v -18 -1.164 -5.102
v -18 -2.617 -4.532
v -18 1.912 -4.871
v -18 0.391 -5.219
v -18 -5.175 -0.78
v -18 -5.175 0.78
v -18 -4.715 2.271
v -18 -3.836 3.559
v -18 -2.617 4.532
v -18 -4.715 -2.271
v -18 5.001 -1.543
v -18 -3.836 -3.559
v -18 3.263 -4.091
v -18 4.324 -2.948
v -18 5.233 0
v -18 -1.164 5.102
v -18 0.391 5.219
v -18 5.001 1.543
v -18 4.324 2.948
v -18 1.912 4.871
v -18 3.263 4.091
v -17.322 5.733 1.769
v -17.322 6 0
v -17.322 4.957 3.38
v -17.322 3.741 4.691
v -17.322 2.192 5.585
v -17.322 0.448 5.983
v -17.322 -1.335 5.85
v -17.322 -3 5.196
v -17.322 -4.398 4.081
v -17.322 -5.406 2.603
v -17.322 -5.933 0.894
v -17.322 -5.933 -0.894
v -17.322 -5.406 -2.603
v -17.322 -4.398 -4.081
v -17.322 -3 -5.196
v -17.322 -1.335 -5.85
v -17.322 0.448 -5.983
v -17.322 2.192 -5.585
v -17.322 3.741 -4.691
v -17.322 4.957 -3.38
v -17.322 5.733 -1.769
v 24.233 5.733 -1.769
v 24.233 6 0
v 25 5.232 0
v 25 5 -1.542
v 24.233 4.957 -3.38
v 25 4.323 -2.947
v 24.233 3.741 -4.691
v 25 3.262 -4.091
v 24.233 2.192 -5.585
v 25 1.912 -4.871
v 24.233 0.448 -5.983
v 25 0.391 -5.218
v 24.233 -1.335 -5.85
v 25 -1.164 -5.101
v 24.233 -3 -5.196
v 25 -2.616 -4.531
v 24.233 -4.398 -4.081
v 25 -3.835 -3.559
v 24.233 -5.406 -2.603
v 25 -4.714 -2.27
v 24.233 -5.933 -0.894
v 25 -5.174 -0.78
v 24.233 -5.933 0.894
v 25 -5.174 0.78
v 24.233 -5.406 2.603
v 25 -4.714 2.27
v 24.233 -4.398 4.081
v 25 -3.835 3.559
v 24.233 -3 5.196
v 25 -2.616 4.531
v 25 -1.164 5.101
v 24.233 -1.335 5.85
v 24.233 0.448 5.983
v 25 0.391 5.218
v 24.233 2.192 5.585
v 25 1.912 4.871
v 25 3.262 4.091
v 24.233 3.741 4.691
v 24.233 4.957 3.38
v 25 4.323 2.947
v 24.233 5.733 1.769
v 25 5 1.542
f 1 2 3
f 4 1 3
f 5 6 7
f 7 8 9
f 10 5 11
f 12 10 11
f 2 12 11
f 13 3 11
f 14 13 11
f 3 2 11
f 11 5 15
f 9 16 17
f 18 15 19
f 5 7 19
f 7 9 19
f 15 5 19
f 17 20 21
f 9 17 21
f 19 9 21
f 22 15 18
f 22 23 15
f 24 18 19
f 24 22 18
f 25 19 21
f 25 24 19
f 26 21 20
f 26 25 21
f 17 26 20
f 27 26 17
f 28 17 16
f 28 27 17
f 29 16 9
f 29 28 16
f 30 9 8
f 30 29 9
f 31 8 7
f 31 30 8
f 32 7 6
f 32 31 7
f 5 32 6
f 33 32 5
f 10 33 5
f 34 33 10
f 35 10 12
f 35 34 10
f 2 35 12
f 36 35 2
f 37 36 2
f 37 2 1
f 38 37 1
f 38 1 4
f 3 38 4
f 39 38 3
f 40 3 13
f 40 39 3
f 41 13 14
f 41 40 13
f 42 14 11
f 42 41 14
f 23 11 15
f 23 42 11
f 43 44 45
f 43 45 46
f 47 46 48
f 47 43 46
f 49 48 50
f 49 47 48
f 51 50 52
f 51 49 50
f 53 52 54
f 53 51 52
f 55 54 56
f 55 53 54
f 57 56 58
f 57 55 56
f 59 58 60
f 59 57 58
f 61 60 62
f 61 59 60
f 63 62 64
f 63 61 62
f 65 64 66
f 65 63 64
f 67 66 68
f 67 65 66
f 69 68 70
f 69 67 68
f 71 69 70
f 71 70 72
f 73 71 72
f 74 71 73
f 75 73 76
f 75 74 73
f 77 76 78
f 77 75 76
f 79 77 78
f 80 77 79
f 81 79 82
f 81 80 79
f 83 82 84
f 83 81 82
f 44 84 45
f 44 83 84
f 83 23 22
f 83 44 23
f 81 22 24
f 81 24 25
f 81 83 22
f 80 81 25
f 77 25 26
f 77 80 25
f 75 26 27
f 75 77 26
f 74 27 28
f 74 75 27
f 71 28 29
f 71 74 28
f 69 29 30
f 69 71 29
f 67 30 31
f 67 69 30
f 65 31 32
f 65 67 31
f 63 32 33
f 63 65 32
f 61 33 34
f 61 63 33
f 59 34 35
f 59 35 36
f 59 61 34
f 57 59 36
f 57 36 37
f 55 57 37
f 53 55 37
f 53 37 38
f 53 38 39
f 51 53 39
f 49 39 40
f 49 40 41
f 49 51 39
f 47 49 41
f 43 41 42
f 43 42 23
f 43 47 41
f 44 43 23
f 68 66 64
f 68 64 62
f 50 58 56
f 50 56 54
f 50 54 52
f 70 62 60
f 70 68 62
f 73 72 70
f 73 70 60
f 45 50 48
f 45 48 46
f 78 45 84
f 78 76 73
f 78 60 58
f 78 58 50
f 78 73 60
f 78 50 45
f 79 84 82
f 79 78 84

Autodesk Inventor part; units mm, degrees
ref_plane "YZ Plane" through (0, 0, 0) normal (1, 0, 0) x (0, 1, 0)
ref_plane "XZ Plane" through (0, 0, 0) normal (0, 1, 0) x (-1, 0, 0)
sketch "Skizze1" plane through (0, 0, 0) normal (0, 0, 1) x (1, 0, 0)
  line L0 (25, 6) -> (25, 0)
  line L1 (-18, 0) -> (25, 0)
  line L2 (-26.6, 0) -> (33.6, 0) projected
  line L3 (0, 7.2) -> (0, -1.2) projected
  line L4 (-18, 6) -> (-18, 0)
  line L5 (2, 6) -> (2, 0) construction
  line L6 (-26.6, 0) -> (33.6, 0) projected
  line L7 (-18, 6) -> (25, 6)
  dimension "d4" = 18
  dimension "d5" = 25
  dimension "d6" = 23
  dimension "d13" = 12
revolve "Körper" add sketch "Skizze1" angle 360 about axis through (-18, 0, 0) along (1, 0, 0)
thread "Gewinde1" size "M12x1.25" class "6g" standard "ISO Metric profile" length 18
thread "Gewinde2" size "M12x1.25" class "6g" standard "ISO Metric profile" length 23.7668
chamfer "Fase1" distance 0.7678 distance2 0.7668 1 edges at (25, -6, 0) measured on face at (25, -3.0269, -1.5886)
chamfer "Fase2" distance 0.6776 distance2 0.7668 1 edges at (-18, -6, 0) measured on face at (10.1555, 5.9223, -0.9625)
ref_plane "Work Plane1" through (2.75, 0, 0) normal (0, -1, 0) x (1, 0, 0)
equation "\"d4\" = KOH"
equation "\"d5\" = NLG"
equation "\"d6\" = GEL"
equation "\"d13\" = GD"
equation "\"d1\" = KOH"
equation "\"d7\" = GEL + GAL"
equation "\"d10\" = -0.5 * SPD + 0.5 * GD"
equation "\"d12\" = -0.5 * SPD + 0.5 * GD"
equation "\"NLG\" = 25"
equation "\"GEL\" = 23"
equation "\"GAL\" = 0.61345 * PTC"
equation "\"SPD\" = NND - 1.2269 * PTC"
equation "\"d0\" = GD"
equation "\"GUL\" = 0.61345 * PTC"
equation "\"KOH\" = 18"
equation "\"GD\" = NND"
equation "\"BDM\" = NND"
equation "\"GUL1\" = 0.67658"
equation "\"GAL1\" = GAL"
equation "\"d80\" = -GUL - GEL"
equation "\"d86\" = -KOH + GUL1"
equation "\"PTC\" = 1.25"
equation "\"THREADDIA\" = 12"
equation "\"TOA\" = 30deg"
equation "\"NND\" = 12"
equation "\"GD1\" = THREADDIA - 1.2269 * PTC"
properties part number "UNI 5910 - M12 x 1,25 x 25" material "Steel, Mild"
